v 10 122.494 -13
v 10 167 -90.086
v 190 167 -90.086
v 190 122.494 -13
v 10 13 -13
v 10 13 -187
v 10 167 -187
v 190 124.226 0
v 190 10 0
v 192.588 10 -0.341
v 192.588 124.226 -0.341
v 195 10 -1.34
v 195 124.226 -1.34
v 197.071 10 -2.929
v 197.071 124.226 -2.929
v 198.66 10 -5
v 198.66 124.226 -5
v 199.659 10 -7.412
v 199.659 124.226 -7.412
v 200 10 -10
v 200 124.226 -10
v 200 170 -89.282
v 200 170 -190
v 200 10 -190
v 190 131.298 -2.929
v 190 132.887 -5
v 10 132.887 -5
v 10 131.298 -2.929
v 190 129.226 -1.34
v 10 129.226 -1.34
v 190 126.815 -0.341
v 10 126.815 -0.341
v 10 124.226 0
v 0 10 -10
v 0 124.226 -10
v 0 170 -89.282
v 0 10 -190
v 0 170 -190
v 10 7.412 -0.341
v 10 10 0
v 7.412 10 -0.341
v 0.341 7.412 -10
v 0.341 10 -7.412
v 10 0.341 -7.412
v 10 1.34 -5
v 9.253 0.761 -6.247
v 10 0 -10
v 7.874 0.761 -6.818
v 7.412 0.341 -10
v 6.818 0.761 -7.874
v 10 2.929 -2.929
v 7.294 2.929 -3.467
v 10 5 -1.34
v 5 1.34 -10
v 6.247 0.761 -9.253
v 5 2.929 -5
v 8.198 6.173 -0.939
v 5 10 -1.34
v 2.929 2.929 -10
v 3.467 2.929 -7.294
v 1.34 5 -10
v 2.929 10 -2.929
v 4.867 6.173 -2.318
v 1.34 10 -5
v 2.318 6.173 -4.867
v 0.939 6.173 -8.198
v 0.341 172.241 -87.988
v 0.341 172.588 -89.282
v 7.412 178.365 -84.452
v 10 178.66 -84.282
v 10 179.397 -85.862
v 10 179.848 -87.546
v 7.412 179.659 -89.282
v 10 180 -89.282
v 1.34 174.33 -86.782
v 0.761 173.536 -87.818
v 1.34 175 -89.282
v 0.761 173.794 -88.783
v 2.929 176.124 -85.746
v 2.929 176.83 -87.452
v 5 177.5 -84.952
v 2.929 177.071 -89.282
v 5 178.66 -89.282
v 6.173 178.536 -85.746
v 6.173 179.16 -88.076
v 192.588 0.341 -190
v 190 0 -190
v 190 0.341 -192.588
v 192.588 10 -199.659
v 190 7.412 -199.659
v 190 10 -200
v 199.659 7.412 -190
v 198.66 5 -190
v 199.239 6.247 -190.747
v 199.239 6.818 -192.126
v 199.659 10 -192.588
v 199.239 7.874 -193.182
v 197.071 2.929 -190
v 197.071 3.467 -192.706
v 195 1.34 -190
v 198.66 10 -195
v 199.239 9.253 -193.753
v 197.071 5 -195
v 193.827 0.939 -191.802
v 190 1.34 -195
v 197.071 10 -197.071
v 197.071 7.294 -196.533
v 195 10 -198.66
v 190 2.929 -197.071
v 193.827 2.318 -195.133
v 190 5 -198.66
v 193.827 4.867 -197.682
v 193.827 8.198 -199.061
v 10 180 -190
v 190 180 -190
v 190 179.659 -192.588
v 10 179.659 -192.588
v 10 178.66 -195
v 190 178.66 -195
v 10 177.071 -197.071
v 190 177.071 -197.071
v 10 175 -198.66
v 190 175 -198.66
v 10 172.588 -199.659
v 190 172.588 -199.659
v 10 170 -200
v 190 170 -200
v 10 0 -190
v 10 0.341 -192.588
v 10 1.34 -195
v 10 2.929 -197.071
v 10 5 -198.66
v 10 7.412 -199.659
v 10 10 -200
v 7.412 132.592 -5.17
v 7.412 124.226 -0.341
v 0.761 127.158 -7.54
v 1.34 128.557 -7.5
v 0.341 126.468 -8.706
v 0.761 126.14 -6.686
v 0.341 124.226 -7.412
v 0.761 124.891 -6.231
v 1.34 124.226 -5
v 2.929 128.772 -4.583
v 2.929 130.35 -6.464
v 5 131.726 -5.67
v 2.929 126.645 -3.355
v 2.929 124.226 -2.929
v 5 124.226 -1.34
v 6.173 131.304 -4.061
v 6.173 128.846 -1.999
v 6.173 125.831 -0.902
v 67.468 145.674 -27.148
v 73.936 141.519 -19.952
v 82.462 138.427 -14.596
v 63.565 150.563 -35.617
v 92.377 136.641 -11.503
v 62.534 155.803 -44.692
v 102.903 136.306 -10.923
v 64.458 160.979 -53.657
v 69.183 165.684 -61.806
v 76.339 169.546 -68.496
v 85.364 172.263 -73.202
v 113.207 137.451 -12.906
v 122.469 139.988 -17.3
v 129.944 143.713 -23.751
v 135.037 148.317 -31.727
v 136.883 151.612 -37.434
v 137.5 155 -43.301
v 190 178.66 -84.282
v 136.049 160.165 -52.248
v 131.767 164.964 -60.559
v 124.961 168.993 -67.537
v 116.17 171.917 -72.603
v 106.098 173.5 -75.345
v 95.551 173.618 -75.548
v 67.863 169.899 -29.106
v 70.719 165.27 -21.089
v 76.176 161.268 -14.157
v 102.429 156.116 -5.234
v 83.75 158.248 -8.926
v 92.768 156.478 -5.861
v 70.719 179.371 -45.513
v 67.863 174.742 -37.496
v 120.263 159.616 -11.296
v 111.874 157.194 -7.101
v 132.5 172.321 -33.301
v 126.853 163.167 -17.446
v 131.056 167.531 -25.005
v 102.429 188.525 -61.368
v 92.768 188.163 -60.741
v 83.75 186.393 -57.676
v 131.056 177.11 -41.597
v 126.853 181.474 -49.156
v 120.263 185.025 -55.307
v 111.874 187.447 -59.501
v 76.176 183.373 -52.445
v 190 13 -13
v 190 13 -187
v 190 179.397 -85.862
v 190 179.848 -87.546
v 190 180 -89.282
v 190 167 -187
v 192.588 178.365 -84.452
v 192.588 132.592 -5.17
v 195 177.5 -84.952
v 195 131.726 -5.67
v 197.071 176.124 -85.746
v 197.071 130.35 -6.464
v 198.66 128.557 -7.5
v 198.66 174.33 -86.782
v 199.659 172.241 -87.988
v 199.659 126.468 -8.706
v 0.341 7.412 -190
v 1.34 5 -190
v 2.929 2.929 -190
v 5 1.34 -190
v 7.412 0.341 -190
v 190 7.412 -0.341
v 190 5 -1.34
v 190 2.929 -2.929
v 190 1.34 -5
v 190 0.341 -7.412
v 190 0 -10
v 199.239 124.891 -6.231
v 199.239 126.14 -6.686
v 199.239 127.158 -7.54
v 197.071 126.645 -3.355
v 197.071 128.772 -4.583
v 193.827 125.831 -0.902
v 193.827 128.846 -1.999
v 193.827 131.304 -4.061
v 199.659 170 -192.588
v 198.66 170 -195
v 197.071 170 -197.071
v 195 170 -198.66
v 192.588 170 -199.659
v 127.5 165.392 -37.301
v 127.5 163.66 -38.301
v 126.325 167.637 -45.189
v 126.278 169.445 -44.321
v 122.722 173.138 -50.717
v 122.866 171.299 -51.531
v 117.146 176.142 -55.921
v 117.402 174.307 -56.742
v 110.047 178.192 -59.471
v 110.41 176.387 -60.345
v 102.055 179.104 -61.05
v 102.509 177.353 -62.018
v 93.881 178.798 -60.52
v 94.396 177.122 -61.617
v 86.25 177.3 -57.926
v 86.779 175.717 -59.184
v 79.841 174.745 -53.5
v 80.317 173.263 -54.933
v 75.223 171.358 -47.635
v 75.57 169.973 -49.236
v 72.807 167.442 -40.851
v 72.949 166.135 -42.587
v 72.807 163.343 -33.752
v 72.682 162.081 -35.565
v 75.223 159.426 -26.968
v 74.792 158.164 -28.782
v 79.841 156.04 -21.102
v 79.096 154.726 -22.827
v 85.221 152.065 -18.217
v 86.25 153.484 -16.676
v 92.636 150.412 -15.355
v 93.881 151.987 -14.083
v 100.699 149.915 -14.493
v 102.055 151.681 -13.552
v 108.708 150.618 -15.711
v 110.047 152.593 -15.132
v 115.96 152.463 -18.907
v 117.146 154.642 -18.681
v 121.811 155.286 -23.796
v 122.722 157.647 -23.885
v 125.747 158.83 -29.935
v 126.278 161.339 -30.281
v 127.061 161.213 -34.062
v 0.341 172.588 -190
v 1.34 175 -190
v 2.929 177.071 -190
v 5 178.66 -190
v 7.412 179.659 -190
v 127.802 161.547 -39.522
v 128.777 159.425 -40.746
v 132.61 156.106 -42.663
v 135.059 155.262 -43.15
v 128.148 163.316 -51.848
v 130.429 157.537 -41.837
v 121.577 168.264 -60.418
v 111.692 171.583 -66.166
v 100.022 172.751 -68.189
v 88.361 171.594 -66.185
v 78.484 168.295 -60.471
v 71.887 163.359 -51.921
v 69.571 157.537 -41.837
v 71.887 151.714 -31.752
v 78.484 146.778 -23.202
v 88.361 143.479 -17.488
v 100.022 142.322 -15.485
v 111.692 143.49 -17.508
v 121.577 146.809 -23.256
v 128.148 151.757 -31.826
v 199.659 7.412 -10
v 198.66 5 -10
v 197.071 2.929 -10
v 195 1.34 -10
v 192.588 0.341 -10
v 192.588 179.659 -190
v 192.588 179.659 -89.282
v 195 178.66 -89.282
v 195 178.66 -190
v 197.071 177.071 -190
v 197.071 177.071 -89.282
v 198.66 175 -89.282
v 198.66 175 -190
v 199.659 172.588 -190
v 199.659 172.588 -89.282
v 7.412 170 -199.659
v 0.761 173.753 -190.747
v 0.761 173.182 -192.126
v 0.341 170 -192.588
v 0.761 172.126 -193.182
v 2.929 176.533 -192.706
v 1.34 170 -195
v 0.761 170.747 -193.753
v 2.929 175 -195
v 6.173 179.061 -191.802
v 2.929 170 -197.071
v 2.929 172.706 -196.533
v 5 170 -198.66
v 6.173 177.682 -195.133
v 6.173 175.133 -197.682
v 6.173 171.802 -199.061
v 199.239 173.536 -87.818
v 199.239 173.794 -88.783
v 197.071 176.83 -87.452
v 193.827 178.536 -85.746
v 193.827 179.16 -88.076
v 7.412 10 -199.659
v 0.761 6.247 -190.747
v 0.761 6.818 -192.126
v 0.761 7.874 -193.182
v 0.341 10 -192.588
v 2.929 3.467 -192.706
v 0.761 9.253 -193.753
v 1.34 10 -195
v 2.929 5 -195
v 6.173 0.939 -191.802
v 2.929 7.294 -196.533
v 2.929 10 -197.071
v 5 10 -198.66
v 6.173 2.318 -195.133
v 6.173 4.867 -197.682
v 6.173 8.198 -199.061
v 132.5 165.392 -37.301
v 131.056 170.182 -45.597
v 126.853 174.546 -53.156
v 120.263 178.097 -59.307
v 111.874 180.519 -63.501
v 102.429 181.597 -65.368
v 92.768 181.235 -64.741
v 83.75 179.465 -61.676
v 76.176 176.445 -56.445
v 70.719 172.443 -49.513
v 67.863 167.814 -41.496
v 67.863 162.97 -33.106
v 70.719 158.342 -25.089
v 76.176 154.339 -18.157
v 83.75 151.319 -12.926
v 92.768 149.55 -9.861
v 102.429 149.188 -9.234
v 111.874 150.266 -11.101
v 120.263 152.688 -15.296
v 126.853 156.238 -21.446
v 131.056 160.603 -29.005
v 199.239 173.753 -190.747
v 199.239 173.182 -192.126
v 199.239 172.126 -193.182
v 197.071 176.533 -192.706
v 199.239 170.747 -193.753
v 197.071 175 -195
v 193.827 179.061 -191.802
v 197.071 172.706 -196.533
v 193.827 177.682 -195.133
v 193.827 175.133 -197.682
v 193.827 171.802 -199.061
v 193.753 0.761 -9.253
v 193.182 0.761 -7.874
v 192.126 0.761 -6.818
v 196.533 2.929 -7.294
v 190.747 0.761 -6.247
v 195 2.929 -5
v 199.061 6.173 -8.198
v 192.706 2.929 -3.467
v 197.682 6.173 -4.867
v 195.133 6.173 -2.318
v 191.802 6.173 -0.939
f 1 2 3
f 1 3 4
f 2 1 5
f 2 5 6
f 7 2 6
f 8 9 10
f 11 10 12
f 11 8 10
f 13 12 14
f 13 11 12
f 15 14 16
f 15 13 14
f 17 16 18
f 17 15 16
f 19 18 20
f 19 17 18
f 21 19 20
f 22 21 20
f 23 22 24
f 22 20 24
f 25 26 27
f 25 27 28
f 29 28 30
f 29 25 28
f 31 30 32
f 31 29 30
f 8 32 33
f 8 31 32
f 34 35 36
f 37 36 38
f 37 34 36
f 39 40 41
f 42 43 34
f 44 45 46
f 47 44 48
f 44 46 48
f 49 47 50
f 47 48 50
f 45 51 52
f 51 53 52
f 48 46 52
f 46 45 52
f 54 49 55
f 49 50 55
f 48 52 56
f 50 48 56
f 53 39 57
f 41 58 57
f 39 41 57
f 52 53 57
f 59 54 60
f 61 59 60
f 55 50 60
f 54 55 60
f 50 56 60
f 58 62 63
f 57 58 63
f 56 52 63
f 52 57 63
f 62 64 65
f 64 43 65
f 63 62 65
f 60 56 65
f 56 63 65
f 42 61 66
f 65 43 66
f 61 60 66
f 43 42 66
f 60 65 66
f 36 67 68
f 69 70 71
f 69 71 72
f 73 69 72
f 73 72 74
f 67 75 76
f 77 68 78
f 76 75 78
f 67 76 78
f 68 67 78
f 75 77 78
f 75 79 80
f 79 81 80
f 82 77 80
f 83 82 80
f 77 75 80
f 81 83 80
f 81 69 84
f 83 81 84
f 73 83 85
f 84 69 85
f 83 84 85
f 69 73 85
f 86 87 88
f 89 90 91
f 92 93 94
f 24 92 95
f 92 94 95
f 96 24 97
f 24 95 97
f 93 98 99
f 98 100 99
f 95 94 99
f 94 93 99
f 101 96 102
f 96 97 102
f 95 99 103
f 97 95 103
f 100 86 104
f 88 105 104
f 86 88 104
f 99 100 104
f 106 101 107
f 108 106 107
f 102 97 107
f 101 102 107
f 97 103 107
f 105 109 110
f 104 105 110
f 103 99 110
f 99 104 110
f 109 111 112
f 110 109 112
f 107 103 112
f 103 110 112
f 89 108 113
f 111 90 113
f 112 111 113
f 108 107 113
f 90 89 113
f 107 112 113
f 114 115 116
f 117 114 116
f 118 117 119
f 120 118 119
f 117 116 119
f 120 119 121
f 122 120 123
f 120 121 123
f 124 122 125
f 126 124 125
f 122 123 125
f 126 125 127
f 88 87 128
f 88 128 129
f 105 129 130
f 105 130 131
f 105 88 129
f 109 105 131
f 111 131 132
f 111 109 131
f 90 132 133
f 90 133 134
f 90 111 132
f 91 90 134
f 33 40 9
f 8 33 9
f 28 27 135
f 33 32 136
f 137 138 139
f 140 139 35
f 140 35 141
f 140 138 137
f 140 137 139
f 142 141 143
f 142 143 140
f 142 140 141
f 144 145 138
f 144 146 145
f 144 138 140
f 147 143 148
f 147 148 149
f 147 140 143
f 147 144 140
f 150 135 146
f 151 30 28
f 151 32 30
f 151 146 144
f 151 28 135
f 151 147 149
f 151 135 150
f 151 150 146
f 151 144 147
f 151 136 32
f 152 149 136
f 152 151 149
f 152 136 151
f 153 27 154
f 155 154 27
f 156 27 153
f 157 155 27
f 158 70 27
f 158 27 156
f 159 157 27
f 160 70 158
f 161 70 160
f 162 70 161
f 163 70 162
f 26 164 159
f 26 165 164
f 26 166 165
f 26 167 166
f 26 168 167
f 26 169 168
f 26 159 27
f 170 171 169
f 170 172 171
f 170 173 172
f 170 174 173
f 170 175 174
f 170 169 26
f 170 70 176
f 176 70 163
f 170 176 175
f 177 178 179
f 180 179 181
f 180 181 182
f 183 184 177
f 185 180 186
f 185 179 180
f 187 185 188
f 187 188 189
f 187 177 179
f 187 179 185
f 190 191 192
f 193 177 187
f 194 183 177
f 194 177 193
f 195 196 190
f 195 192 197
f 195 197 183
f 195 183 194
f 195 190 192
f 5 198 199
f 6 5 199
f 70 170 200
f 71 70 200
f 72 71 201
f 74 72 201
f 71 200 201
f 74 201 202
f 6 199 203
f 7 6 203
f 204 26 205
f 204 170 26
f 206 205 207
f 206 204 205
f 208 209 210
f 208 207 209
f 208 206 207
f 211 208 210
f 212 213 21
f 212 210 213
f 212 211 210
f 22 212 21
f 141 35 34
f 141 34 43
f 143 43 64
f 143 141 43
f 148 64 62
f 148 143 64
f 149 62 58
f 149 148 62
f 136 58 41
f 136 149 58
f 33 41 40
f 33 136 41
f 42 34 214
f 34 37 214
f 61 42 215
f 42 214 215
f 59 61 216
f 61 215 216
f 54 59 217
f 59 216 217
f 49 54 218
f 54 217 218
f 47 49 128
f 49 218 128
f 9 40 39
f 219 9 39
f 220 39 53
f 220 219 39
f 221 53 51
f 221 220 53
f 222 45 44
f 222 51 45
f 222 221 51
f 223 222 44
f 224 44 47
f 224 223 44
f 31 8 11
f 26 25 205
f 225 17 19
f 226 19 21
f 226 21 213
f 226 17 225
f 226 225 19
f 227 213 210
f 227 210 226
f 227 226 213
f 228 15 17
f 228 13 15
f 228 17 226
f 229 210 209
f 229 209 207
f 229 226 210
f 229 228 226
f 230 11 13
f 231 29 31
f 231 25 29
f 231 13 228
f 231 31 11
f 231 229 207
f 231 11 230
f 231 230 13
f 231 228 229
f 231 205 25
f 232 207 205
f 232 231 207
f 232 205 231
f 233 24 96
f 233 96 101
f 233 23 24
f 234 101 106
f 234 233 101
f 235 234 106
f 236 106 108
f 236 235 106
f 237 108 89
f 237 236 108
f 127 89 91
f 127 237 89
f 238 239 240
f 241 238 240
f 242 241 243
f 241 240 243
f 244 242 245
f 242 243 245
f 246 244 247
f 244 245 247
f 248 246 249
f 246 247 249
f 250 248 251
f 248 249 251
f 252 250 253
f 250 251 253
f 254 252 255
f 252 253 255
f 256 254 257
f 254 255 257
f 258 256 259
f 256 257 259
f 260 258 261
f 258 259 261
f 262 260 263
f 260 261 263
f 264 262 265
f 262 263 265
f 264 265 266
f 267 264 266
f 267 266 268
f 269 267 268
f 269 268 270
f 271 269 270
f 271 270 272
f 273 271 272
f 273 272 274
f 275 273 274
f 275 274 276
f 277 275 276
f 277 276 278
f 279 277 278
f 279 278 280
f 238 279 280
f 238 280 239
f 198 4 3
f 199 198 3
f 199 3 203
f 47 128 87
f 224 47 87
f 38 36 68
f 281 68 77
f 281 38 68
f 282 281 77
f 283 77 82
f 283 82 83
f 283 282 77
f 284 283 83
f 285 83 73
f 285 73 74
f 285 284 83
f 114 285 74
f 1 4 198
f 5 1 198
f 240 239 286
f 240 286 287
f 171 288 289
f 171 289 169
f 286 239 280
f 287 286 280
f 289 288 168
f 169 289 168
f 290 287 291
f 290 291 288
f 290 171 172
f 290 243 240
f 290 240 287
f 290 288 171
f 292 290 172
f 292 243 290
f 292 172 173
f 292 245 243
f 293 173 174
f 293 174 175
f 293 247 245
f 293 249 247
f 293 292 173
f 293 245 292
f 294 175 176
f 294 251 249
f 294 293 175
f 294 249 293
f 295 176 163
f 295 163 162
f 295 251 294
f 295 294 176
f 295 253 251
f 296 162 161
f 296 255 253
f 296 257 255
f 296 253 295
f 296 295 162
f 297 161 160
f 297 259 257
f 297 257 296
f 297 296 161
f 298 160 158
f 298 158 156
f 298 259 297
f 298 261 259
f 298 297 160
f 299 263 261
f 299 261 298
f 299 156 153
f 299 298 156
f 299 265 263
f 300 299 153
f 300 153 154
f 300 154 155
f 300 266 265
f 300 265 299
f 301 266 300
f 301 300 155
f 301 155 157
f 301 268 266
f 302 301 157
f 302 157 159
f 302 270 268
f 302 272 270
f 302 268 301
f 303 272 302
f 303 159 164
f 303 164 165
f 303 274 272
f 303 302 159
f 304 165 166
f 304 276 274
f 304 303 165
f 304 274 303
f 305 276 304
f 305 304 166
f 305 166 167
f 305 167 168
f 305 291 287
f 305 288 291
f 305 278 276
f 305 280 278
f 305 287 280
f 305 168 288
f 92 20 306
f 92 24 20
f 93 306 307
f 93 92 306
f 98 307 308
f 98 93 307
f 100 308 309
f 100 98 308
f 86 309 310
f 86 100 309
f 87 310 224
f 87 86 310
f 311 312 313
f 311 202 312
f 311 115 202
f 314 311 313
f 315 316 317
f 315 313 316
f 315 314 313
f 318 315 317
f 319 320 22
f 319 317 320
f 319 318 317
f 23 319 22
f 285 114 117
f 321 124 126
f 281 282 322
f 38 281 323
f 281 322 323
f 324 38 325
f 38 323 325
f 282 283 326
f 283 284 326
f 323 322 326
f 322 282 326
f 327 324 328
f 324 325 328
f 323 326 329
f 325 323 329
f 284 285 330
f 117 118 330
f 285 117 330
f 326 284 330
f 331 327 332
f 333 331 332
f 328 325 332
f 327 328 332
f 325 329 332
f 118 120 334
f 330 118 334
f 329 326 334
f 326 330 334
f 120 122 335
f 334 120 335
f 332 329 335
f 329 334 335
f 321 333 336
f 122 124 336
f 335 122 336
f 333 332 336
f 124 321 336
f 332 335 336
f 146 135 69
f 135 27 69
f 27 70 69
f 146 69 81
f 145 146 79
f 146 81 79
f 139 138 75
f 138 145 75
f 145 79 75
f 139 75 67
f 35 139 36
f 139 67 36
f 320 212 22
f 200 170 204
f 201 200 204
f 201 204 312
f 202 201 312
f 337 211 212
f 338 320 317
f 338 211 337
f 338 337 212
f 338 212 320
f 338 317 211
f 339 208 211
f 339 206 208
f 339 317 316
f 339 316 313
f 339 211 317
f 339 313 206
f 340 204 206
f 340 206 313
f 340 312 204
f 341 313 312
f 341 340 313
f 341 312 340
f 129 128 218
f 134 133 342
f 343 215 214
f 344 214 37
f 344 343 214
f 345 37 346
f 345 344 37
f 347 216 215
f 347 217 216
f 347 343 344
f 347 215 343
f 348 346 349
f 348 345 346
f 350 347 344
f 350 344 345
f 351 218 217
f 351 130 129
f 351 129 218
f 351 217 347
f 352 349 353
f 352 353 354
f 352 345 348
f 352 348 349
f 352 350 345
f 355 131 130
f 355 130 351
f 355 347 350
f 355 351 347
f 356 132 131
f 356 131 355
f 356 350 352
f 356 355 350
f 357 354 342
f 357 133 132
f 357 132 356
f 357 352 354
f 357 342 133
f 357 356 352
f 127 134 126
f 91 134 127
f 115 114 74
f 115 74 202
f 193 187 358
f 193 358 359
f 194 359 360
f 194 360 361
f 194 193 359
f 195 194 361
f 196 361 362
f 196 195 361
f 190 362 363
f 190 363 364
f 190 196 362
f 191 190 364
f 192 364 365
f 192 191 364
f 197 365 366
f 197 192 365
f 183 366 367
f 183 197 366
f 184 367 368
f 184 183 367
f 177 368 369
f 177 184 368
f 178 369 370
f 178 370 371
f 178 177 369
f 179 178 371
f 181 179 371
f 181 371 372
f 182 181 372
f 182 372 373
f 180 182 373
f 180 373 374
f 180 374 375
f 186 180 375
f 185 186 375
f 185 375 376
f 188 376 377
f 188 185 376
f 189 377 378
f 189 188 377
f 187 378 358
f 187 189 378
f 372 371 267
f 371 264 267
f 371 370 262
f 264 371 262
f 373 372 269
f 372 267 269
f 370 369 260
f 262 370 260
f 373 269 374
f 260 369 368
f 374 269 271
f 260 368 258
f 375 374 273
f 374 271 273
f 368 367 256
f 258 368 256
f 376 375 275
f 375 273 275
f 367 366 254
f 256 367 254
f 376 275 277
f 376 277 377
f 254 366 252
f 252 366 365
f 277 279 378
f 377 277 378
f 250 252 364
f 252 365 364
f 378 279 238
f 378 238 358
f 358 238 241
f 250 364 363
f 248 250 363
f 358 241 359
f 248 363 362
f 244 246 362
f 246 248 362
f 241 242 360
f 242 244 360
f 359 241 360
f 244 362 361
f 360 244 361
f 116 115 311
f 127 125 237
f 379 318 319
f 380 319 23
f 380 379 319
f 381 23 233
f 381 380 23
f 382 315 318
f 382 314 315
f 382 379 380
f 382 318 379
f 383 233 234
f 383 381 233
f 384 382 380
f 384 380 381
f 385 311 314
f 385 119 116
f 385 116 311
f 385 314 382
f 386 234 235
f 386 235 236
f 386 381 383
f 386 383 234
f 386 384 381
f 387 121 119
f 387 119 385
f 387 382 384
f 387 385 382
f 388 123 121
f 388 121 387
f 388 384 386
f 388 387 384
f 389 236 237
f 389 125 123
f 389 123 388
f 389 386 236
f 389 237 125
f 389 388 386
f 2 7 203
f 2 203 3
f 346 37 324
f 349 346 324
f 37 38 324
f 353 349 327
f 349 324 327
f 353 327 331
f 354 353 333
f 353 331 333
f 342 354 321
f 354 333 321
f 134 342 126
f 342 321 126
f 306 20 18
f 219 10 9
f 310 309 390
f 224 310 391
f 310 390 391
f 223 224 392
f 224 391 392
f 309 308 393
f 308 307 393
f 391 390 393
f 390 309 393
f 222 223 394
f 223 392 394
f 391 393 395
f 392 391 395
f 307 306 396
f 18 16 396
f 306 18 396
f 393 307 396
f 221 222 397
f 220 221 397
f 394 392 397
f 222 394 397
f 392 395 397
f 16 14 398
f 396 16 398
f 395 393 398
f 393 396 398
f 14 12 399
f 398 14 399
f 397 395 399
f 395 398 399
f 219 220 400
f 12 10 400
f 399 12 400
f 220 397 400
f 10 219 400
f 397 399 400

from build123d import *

# Parameters (mm, degrees)
SKETCH_1_W          = 200
SKETCH_1_H          = 200
EXTRUDE_1_DEPTH     = 180
CHAMFER_1_SIZE      = 50
CHAMFER_1_SIZE2     = 86.602540378
SKETCH_2_R          = 27.5
EXTRUDE_2_DEPTH     = 20
EXTRUDE_START       = 12
SKETCH_2_3_R        = 32.5
SKETCH_2_3_R_2      = 27.5
EXTRUDE_3_DEPTH     = 8
FILLET_1_R          = 10
CUT_EXTRUDE_START   = -10
CUT_EXTRUDE_1_DEPTH = 180


with BuildPart() as part:
    # 스케치1 → 보스-돌출1 (new body)
    with BuildSketch(Plane(origin=(0, 0, 0), x_dir=(1, 0, 0), z_dir=(0, 1, 0))):
        with Locations((100, 100)):
            Rectangle(SKETCH_1_W, SKETCH_1_H)
    extrude(amount=EXTRUDE_1_DEPTH)

    # 모따기1
    chamfer_1_edges = [part.edges().sort_by_distance(p)[0] for p in [
        (100, 180, 0),
    ]]
    chamfer_1_side = [part.faces().sort_by_distance(p)[0] for p in [
        (100, 90, 0),
    ]]
    chamfer(chamfer_1_edges, length=CHAMFER_1_SIZE, length2=CHAMFER_1_SIZE2, reference=chamfer_1_side[0])

    # 스케치2 → 보스-돌출2 (add)
    with BuildSketch(Plane(origin=(0, 97.5, 56.291651246), x_dir=(1, 0, 0), z_dir=(0, 0.8660254037844379, 0.5000000000000014))):
        with Locations((100, 115)):
            Circle(SKETCH_2_R)
    extrude(amount=EXTRUDE_2_DEPTH)

    # 스케치2<3> → 보스-돌출3 (add)
    with BuildSketch(Plane(origin=(0, 97.5, 56.291651246), x_dir=(1, 0, 0), z_dir=(0, 0.8660254037844379, 0.5000000000000014)).offset(EXTRUDE_START)):
        with Locations((100, 115)):
            Circle(SKETCH_2_3_R)
        with Locations((100, 115)):
            Circle(SKETCH_2_3_R_2, mode=Mode.SUBTRACT)
    extrude(amount=EXTRUDE_3_DEPTH)

    # 필렛1
    fillet_1_edges = [part.edges().sort_by_distance(p)[0] for p in [
        (72.5, 155, -43.301270189),
        (100, 180, -86.602540378),
        (0, 180, -143.301270189),
        (0, 155, -43.301270189),
        (100, 180, -200),
        (0, 90, -200),
        (200, 90, -200),
        (200, 155, -43.301270189),
        (200, 180, -143.301270189),
        (0, 65, 0),
        (100, 130, 0),
        (200, 65, 0),
        (100, 0, 0),
        (200, 0, -100),
        (100, 0, -200),
        (0, 0, -100),
    ]]
    fillet(fillet_1_edges, radius=FILLET_1_R)

    # 스케치3 → 컷-돌출1 (cut)
    with BuildSketch(Plane(origin=(200, 0, 0), x_dir=(0, 0, -1), z_dir=(1, 0, 0)).offset(CUT_EXTRUDE_START)):
        Polygon((187, 13), (187, 167), (90.08587988, 167), (13, 122.494446501), (13, 13), align=None)
    extrude(amount=-CUT_EXTRUDE_1_DEPTH, mode=Mode.SUBTRACT)


solid = part.part
